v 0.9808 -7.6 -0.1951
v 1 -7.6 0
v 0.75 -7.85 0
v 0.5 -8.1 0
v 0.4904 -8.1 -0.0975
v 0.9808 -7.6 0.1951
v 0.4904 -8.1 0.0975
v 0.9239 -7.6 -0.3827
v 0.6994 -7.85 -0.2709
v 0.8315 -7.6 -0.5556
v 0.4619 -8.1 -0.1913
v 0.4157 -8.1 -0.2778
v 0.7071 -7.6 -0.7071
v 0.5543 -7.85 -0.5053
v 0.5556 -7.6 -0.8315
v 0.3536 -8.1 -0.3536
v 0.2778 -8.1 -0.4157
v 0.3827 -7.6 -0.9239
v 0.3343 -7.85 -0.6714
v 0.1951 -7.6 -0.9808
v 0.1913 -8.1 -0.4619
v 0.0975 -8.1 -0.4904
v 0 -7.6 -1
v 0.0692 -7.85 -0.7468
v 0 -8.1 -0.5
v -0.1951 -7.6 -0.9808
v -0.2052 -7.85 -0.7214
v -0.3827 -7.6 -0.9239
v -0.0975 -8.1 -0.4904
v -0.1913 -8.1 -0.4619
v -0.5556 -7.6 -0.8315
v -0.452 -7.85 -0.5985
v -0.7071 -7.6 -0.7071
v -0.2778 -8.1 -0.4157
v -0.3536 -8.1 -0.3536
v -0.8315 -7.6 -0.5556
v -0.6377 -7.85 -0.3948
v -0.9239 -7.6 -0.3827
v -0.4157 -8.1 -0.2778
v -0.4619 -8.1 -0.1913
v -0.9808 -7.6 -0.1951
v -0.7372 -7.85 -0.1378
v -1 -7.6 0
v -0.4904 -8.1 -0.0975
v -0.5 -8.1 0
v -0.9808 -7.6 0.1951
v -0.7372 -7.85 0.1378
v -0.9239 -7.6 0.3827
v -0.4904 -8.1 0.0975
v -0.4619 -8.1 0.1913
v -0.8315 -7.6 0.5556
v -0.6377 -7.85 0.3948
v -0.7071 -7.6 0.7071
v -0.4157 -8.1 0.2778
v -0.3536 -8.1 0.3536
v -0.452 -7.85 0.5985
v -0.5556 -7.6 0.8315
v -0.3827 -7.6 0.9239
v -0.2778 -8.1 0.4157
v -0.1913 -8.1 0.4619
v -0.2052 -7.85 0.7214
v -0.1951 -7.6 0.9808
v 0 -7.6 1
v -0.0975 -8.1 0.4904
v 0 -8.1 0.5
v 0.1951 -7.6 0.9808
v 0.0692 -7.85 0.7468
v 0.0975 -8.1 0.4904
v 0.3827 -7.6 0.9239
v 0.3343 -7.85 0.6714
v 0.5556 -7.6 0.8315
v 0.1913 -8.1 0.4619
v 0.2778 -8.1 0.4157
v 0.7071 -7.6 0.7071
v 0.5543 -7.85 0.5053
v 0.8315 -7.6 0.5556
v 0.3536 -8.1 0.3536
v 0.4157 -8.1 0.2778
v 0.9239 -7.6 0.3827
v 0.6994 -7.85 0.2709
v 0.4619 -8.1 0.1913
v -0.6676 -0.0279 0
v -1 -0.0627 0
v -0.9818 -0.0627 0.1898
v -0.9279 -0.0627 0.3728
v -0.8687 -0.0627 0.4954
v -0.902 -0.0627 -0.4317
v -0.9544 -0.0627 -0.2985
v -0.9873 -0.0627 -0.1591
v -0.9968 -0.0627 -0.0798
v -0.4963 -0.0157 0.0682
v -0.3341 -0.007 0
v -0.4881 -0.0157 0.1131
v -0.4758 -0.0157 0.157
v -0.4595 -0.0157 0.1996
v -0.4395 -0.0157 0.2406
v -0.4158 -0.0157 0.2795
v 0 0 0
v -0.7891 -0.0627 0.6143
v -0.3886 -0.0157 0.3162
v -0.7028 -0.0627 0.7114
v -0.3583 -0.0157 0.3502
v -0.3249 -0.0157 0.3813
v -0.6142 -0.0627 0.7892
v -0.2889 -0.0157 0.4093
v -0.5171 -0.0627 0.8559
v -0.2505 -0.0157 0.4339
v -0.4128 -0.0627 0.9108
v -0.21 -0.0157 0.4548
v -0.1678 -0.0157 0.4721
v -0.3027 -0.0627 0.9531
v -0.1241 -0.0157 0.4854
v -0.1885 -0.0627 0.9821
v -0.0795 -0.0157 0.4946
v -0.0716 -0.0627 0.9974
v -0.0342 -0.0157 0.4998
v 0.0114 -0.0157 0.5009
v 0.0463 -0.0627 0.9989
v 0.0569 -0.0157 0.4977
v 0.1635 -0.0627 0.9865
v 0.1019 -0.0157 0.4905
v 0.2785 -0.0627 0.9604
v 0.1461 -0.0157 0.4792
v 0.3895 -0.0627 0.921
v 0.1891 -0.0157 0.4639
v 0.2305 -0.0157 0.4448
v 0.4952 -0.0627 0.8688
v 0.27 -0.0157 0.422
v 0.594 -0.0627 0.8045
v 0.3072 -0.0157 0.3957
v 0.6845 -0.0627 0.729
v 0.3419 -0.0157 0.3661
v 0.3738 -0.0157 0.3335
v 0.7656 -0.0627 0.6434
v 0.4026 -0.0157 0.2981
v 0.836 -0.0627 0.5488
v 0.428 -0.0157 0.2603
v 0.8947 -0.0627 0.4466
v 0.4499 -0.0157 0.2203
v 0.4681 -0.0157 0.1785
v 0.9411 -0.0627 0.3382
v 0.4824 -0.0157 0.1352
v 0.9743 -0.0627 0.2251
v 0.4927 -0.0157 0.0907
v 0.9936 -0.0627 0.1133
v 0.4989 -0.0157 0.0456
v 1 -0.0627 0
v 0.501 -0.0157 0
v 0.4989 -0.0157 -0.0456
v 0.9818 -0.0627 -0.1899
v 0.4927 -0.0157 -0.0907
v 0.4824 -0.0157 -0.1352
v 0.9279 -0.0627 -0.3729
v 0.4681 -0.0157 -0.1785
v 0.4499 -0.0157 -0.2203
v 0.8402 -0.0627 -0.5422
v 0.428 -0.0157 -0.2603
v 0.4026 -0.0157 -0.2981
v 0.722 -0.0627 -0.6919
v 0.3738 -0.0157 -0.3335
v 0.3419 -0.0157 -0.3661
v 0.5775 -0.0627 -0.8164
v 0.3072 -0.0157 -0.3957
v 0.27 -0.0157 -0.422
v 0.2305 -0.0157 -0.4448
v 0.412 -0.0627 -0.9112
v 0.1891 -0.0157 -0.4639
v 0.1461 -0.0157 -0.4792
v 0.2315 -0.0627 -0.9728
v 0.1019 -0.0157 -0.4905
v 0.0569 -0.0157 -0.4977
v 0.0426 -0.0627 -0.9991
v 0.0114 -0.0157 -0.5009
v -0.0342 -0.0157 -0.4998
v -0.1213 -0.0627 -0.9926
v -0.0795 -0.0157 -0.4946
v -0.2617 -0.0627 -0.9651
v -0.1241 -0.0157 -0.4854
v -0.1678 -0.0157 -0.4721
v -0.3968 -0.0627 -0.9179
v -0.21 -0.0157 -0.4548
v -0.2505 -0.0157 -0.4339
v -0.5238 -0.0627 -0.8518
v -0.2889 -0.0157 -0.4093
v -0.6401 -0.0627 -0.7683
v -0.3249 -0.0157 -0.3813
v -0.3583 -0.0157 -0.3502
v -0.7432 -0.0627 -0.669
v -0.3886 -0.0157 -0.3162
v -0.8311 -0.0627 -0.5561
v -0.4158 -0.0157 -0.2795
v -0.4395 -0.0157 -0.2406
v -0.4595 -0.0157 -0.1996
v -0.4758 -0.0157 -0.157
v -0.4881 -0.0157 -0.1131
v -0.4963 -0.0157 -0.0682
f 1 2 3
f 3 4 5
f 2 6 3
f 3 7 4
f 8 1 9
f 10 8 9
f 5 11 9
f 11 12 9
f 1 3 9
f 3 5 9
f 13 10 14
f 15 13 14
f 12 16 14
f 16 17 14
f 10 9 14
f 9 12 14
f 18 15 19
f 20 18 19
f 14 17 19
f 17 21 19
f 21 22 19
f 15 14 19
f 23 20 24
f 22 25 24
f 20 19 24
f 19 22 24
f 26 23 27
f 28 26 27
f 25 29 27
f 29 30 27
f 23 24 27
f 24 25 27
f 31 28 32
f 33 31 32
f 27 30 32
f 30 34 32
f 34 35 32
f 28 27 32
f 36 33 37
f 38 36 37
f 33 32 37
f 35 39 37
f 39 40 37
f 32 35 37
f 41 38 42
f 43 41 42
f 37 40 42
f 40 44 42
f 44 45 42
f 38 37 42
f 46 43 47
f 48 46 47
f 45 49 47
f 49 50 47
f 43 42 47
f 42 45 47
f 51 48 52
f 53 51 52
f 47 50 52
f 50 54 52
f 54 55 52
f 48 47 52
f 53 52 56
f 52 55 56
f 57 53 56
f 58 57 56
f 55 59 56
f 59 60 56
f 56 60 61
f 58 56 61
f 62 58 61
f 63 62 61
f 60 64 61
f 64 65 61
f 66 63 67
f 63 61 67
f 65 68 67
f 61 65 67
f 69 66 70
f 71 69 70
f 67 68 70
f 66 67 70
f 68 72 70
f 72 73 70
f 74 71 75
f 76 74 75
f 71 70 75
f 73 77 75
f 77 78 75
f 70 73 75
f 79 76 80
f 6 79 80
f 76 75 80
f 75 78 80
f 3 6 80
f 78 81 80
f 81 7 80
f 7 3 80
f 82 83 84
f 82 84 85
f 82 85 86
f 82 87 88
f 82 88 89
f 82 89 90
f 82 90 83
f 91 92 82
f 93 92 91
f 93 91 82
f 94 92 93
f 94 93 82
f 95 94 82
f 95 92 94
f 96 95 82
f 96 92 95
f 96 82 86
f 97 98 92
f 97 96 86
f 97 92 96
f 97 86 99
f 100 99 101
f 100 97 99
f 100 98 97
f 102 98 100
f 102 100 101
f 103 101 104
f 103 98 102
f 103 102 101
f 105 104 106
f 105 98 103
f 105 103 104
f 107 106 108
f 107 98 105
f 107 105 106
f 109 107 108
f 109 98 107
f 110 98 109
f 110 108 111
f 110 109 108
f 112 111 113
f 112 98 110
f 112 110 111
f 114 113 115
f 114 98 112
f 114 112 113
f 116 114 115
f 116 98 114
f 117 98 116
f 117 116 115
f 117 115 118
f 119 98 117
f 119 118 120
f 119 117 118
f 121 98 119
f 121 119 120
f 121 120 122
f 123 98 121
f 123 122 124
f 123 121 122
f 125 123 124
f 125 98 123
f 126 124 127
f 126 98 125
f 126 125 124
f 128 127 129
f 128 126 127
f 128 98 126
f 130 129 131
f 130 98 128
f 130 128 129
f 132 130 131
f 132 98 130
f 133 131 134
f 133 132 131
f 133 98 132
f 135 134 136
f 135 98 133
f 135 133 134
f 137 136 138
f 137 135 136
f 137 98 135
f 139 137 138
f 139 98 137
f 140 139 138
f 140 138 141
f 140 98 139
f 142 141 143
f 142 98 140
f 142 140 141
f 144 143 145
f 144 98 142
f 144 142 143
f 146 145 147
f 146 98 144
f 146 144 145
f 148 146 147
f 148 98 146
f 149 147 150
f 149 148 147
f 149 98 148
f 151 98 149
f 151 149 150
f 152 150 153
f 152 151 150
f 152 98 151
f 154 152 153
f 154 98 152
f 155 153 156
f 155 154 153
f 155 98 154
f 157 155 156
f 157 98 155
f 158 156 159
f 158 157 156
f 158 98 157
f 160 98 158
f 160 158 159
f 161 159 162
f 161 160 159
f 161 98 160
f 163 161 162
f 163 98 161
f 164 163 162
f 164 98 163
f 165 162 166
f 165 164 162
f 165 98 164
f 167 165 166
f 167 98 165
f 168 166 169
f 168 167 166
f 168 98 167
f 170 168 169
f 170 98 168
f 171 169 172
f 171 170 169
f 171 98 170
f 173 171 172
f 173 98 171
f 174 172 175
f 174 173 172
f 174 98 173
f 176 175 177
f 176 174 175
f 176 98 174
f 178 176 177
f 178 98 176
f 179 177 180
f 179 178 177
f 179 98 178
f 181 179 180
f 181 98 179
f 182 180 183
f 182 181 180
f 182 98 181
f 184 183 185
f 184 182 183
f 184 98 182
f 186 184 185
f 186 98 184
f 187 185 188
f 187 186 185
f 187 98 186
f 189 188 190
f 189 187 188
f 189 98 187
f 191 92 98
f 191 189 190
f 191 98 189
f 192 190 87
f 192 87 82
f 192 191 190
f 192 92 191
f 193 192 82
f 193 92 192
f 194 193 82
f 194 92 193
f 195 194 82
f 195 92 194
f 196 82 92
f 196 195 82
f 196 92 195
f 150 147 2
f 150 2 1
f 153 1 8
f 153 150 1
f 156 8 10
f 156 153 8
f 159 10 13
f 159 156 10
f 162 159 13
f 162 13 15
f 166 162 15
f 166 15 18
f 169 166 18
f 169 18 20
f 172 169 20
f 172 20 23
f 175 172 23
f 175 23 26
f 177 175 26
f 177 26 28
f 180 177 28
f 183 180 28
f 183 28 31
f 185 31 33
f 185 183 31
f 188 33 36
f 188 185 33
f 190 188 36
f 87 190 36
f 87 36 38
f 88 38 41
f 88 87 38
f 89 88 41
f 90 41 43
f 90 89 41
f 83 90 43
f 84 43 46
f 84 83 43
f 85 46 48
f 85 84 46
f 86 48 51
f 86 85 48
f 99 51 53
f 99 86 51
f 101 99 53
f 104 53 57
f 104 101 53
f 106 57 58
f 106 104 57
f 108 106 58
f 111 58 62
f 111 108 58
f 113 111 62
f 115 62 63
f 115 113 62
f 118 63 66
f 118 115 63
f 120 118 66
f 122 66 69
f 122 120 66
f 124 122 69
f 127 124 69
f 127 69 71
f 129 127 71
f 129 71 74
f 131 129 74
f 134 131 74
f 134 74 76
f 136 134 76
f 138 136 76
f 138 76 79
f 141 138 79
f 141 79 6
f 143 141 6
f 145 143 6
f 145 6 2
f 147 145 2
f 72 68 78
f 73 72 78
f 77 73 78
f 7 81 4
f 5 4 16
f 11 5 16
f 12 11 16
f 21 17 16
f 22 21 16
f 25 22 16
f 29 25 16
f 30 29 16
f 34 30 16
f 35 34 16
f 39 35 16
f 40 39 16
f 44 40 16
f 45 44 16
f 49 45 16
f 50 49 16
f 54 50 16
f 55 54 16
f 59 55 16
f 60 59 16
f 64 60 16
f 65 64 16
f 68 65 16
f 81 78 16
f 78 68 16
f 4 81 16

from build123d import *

# Parameters (mm, degrees)
SKETCH1_R                 = 1
BOSS_EXTRUDE_8_10MM_DEPTH = 8.1
F_0_5_X_45_DEG_SIZE       = 0.5


with BuildPart() as part:
    # Sketch1 → Boss-Extrude 8.10mm (new body)
    with BuildSketch(Plane(origin=(0, 0, 0), x_dir=(1, 0, 0), z_dir=(0, 1, 0))):
        Circle(SKETCH1_R)
    extrude(amount=-BOSS_EXTRUDE_8_10MM_DEPTH)

    # 0.5 x 45 deg
    f_0_5_x_45_deg_edges = [part.edges().sort_by_distance(p)[0] for p in [
        (-1, -8.1, 0),
    ]]
    chamfer(f_0_5_x_45_deg_edges, length=F_0_5_X_45_DEG_SIZE)

    # Sketch2 → SR8 (revolve, cut)
    with BuildSketch(Plane.XY):
        with BuildLine():
            Line((0, 2), (-2, 2))
            Line((-2, 2), (-2, -0.254033308))
            ThreePointArc((-2, -0.254033308), (-1.00803434, -0.06376243), (0, 0))
            Line((0, 0), (0, 2))
        make_face()
    revolve(axis=Axis((0, 0, 0), (0, 1, 0)), mode=Mode.SUBTRACT)


solid = part.part
